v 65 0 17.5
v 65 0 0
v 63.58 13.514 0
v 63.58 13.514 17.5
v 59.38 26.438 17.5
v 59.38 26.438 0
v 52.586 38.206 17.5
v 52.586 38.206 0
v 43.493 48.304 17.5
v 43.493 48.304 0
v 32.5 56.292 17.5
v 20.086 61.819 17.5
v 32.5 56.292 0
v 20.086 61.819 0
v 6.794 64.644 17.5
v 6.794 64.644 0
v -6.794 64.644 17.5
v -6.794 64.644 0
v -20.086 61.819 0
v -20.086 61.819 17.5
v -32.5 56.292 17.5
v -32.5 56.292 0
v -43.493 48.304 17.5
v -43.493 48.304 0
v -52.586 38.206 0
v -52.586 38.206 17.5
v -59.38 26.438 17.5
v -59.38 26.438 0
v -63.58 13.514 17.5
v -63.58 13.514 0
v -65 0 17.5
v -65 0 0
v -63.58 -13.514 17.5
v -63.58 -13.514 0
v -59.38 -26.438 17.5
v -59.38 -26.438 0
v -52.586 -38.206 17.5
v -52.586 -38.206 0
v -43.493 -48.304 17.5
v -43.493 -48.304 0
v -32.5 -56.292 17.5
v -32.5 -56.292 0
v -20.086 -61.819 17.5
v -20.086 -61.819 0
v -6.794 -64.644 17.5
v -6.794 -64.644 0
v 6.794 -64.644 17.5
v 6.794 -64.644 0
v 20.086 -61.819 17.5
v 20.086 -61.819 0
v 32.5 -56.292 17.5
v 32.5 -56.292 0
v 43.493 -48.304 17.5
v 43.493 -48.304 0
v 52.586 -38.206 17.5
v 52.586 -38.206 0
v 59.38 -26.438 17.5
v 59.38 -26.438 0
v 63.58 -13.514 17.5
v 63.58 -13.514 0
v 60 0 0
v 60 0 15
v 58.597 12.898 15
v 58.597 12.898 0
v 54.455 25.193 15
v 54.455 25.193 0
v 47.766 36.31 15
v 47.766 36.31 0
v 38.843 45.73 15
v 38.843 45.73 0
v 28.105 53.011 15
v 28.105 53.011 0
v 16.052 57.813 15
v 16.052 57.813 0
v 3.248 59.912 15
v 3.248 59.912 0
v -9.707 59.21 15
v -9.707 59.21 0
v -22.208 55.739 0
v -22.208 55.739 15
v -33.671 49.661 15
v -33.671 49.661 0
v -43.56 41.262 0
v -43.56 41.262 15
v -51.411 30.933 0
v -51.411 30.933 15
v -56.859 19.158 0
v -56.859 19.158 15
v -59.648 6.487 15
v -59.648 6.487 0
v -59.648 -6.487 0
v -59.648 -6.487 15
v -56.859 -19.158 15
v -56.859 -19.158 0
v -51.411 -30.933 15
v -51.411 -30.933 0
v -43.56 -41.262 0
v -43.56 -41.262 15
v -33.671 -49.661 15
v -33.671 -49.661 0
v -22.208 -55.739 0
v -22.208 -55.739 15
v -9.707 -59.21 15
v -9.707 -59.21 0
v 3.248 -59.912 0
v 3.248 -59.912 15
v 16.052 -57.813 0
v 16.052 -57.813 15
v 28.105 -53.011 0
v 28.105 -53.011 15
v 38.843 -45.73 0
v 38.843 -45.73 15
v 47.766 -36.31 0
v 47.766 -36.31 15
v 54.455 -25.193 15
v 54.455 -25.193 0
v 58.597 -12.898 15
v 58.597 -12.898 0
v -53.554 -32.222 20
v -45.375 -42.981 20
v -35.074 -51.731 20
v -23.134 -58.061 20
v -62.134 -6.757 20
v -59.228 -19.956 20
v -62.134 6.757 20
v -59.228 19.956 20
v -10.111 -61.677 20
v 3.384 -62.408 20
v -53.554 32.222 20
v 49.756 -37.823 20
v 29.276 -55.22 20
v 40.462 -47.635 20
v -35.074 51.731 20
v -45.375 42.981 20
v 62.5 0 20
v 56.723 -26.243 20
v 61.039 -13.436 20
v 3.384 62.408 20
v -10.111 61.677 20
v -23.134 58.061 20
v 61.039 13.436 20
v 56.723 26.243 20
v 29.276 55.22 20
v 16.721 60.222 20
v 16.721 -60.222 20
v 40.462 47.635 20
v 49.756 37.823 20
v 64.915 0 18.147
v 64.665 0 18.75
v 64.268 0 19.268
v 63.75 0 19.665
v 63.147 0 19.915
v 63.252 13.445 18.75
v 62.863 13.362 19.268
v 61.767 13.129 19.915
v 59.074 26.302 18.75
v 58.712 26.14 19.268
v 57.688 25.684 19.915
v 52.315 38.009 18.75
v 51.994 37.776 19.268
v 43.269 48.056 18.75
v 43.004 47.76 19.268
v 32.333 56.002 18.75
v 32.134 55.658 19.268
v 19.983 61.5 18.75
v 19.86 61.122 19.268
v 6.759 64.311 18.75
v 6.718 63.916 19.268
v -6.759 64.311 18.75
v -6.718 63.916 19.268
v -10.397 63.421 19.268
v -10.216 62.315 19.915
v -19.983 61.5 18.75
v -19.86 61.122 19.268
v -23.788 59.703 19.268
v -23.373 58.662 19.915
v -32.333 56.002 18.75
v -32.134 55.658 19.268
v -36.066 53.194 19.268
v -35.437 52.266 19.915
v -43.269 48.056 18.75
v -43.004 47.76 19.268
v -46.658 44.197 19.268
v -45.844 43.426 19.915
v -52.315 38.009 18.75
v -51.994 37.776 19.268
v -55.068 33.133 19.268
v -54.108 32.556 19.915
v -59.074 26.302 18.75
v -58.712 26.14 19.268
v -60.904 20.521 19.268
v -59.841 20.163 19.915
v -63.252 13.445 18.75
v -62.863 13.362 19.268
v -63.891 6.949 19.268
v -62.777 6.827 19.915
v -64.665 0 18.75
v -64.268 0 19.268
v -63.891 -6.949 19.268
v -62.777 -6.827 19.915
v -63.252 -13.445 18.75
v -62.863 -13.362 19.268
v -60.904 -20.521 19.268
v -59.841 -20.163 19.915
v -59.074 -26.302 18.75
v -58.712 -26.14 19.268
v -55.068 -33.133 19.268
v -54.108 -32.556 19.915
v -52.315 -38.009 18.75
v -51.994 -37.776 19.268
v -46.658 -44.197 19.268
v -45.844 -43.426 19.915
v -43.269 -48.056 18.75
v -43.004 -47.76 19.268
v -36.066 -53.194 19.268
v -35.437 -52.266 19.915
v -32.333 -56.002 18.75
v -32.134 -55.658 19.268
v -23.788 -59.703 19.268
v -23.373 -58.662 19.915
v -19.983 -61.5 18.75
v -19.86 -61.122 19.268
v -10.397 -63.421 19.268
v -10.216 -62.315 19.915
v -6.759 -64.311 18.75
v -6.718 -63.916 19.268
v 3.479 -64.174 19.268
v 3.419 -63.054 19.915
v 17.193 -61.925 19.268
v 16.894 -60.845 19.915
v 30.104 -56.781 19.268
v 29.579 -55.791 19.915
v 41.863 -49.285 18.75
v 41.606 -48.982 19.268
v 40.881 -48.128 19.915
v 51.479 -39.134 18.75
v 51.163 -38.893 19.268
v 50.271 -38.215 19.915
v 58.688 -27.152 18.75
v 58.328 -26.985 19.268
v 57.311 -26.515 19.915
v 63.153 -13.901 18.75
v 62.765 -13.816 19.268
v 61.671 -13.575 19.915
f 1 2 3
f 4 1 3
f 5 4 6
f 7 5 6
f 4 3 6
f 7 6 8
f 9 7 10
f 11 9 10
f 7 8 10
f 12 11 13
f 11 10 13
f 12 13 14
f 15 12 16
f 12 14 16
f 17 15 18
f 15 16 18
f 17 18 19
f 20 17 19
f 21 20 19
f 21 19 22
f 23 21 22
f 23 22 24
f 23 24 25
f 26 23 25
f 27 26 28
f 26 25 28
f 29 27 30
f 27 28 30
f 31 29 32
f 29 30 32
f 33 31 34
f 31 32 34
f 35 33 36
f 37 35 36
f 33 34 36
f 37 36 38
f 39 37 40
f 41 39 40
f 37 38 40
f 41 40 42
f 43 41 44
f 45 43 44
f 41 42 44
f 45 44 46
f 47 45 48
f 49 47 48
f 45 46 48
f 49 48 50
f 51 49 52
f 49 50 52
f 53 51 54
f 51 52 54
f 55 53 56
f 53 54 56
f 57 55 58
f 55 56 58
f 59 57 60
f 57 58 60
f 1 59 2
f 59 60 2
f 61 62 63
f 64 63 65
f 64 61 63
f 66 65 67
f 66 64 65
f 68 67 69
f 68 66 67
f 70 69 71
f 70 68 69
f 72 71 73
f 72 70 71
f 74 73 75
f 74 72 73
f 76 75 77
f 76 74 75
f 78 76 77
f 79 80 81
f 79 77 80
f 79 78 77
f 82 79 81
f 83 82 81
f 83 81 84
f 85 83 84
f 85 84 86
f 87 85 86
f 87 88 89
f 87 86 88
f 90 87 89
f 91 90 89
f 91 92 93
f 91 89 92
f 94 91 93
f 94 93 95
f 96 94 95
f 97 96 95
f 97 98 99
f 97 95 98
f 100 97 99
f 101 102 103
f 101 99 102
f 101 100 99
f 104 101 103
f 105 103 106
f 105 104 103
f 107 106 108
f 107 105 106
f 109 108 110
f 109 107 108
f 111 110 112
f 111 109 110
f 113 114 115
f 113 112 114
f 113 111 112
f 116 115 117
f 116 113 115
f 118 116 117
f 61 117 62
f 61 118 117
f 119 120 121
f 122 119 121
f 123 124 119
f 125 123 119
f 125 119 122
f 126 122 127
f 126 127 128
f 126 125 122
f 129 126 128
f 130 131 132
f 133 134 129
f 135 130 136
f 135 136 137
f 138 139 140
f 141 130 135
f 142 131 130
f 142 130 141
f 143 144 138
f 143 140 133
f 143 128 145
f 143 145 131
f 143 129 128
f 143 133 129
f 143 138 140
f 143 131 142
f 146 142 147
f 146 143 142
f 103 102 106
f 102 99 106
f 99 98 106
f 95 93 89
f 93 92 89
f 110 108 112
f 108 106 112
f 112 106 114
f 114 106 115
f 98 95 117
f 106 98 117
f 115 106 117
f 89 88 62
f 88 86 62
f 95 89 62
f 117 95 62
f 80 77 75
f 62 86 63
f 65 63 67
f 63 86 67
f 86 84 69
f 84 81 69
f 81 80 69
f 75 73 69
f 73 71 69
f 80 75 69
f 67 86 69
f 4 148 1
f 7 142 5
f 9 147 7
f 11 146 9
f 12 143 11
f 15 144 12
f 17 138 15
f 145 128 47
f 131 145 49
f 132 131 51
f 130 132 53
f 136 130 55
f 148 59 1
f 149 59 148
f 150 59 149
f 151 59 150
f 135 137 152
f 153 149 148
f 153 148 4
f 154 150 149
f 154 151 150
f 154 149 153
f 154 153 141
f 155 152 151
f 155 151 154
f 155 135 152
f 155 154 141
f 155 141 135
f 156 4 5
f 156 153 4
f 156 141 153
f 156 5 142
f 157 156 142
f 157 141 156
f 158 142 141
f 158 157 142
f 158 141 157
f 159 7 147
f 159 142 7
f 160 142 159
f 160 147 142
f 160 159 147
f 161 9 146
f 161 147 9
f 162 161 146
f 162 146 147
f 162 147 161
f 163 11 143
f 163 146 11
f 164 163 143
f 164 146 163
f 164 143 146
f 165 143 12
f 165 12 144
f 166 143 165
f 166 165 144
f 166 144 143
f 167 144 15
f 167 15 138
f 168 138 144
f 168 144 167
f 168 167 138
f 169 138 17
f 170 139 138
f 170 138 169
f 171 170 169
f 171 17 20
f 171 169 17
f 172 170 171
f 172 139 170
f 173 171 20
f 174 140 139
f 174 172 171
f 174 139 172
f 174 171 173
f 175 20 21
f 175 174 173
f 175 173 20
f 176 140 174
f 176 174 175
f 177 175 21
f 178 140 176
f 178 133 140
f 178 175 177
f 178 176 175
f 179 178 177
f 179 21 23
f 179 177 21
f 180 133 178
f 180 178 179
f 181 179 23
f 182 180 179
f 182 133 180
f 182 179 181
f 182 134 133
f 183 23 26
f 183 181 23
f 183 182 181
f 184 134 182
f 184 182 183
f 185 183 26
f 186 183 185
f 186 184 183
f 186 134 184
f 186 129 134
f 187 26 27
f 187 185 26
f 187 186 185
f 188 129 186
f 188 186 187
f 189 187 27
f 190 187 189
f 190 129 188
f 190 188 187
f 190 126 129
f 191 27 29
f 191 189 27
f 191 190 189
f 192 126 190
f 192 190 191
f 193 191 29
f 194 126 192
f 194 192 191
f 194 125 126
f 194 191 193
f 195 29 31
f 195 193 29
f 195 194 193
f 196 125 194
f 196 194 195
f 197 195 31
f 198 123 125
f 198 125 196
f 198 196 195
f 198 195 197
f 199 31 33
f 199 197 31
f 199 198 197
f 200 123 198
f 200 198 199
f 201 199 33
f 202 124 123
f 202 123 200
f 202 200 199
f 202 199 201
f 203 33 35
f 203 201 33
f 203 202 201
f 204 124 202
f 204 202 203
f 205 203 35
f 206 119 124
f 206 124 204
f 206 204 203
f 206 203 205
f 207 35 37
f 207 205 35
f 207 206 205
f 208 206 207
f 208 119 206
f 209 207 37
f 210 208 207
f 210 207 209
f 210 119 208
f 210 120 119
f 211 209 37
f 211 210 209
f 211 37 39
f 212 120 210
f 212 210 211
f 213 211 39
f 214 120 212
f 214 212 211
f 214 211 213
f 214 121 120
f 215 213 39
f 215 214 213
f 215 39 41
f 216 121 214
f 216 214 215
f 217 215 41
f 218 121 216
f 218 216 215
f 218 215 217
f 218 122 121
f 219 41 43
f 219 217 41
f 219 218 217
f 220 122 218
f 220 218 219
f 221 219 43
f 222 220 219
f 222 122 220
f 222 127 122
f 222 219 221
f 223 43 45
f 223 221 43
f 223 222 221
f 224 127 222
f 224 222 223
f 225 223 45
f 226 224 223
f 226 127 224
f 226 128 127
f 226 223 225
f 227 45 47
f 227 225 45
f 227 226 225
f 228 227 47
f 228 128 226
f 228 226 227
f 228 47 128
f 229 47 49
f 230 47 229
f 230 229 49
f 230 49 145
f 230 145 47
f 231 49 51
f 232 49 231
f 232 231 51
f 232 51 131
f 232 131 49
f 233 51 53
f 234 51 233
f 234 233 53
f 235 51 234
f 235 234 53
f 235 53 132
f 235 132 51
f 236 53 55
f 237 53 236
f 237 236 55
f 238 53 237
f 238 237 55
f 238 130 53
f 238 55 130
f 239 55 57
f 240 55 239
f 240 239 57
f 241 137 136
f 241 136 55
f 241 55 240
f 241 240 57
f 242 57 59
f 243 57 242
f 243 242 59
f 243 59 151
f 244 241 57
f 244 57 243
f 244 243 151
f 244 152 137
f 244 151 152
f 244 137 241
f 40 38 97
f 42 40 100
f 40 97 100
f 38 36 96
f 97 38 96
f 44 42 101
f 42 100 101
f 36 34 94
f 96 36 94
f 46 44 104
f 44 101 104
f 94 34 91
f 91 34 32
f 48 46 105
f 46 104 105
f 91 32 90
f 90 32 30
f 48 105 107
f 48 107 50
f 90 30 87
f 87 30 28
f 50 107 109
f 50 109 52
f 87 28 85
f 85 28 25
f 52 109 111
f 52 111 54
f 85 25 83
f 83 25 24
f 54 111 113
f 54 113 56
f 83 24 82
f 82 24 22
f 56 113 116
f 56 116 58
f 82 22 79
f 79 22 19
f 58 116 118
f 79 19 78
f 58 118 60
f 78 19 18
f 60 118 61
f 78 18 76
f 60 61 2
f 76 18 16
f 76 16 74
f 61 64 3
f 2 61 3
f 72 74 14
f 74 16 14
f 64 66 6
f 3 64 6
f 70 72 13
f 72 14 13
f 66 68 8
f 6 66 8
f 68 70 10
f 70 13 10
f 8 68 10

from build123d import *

# Parameters (mm, degrees)
F0_R     = 65
F1_DEPTH = 20
F2_T     = -5
F3_R     = 2.5


with BuildPart() as f1:
    # F0 (on Top) → F1 (new body)
    with BuildSketch(Plane.XY):
        Circle(F0_R)
    extrude(amount=F1_DEPTH)

    # F2
    f2_openings = [f1.faces().sort_by_distance(p)[0] for p in [
        (0, 0, 0),
    ]]
    offset(amount=F2_T, openings=f2_openings)

    # F3
    f3_edges = [f1.edges().sort_by_distance(p)[0] for p in [
        (-65, 0, 20),
    ]]
    fillet(f3_edges, radius=F3_R)


solid = f1.part
